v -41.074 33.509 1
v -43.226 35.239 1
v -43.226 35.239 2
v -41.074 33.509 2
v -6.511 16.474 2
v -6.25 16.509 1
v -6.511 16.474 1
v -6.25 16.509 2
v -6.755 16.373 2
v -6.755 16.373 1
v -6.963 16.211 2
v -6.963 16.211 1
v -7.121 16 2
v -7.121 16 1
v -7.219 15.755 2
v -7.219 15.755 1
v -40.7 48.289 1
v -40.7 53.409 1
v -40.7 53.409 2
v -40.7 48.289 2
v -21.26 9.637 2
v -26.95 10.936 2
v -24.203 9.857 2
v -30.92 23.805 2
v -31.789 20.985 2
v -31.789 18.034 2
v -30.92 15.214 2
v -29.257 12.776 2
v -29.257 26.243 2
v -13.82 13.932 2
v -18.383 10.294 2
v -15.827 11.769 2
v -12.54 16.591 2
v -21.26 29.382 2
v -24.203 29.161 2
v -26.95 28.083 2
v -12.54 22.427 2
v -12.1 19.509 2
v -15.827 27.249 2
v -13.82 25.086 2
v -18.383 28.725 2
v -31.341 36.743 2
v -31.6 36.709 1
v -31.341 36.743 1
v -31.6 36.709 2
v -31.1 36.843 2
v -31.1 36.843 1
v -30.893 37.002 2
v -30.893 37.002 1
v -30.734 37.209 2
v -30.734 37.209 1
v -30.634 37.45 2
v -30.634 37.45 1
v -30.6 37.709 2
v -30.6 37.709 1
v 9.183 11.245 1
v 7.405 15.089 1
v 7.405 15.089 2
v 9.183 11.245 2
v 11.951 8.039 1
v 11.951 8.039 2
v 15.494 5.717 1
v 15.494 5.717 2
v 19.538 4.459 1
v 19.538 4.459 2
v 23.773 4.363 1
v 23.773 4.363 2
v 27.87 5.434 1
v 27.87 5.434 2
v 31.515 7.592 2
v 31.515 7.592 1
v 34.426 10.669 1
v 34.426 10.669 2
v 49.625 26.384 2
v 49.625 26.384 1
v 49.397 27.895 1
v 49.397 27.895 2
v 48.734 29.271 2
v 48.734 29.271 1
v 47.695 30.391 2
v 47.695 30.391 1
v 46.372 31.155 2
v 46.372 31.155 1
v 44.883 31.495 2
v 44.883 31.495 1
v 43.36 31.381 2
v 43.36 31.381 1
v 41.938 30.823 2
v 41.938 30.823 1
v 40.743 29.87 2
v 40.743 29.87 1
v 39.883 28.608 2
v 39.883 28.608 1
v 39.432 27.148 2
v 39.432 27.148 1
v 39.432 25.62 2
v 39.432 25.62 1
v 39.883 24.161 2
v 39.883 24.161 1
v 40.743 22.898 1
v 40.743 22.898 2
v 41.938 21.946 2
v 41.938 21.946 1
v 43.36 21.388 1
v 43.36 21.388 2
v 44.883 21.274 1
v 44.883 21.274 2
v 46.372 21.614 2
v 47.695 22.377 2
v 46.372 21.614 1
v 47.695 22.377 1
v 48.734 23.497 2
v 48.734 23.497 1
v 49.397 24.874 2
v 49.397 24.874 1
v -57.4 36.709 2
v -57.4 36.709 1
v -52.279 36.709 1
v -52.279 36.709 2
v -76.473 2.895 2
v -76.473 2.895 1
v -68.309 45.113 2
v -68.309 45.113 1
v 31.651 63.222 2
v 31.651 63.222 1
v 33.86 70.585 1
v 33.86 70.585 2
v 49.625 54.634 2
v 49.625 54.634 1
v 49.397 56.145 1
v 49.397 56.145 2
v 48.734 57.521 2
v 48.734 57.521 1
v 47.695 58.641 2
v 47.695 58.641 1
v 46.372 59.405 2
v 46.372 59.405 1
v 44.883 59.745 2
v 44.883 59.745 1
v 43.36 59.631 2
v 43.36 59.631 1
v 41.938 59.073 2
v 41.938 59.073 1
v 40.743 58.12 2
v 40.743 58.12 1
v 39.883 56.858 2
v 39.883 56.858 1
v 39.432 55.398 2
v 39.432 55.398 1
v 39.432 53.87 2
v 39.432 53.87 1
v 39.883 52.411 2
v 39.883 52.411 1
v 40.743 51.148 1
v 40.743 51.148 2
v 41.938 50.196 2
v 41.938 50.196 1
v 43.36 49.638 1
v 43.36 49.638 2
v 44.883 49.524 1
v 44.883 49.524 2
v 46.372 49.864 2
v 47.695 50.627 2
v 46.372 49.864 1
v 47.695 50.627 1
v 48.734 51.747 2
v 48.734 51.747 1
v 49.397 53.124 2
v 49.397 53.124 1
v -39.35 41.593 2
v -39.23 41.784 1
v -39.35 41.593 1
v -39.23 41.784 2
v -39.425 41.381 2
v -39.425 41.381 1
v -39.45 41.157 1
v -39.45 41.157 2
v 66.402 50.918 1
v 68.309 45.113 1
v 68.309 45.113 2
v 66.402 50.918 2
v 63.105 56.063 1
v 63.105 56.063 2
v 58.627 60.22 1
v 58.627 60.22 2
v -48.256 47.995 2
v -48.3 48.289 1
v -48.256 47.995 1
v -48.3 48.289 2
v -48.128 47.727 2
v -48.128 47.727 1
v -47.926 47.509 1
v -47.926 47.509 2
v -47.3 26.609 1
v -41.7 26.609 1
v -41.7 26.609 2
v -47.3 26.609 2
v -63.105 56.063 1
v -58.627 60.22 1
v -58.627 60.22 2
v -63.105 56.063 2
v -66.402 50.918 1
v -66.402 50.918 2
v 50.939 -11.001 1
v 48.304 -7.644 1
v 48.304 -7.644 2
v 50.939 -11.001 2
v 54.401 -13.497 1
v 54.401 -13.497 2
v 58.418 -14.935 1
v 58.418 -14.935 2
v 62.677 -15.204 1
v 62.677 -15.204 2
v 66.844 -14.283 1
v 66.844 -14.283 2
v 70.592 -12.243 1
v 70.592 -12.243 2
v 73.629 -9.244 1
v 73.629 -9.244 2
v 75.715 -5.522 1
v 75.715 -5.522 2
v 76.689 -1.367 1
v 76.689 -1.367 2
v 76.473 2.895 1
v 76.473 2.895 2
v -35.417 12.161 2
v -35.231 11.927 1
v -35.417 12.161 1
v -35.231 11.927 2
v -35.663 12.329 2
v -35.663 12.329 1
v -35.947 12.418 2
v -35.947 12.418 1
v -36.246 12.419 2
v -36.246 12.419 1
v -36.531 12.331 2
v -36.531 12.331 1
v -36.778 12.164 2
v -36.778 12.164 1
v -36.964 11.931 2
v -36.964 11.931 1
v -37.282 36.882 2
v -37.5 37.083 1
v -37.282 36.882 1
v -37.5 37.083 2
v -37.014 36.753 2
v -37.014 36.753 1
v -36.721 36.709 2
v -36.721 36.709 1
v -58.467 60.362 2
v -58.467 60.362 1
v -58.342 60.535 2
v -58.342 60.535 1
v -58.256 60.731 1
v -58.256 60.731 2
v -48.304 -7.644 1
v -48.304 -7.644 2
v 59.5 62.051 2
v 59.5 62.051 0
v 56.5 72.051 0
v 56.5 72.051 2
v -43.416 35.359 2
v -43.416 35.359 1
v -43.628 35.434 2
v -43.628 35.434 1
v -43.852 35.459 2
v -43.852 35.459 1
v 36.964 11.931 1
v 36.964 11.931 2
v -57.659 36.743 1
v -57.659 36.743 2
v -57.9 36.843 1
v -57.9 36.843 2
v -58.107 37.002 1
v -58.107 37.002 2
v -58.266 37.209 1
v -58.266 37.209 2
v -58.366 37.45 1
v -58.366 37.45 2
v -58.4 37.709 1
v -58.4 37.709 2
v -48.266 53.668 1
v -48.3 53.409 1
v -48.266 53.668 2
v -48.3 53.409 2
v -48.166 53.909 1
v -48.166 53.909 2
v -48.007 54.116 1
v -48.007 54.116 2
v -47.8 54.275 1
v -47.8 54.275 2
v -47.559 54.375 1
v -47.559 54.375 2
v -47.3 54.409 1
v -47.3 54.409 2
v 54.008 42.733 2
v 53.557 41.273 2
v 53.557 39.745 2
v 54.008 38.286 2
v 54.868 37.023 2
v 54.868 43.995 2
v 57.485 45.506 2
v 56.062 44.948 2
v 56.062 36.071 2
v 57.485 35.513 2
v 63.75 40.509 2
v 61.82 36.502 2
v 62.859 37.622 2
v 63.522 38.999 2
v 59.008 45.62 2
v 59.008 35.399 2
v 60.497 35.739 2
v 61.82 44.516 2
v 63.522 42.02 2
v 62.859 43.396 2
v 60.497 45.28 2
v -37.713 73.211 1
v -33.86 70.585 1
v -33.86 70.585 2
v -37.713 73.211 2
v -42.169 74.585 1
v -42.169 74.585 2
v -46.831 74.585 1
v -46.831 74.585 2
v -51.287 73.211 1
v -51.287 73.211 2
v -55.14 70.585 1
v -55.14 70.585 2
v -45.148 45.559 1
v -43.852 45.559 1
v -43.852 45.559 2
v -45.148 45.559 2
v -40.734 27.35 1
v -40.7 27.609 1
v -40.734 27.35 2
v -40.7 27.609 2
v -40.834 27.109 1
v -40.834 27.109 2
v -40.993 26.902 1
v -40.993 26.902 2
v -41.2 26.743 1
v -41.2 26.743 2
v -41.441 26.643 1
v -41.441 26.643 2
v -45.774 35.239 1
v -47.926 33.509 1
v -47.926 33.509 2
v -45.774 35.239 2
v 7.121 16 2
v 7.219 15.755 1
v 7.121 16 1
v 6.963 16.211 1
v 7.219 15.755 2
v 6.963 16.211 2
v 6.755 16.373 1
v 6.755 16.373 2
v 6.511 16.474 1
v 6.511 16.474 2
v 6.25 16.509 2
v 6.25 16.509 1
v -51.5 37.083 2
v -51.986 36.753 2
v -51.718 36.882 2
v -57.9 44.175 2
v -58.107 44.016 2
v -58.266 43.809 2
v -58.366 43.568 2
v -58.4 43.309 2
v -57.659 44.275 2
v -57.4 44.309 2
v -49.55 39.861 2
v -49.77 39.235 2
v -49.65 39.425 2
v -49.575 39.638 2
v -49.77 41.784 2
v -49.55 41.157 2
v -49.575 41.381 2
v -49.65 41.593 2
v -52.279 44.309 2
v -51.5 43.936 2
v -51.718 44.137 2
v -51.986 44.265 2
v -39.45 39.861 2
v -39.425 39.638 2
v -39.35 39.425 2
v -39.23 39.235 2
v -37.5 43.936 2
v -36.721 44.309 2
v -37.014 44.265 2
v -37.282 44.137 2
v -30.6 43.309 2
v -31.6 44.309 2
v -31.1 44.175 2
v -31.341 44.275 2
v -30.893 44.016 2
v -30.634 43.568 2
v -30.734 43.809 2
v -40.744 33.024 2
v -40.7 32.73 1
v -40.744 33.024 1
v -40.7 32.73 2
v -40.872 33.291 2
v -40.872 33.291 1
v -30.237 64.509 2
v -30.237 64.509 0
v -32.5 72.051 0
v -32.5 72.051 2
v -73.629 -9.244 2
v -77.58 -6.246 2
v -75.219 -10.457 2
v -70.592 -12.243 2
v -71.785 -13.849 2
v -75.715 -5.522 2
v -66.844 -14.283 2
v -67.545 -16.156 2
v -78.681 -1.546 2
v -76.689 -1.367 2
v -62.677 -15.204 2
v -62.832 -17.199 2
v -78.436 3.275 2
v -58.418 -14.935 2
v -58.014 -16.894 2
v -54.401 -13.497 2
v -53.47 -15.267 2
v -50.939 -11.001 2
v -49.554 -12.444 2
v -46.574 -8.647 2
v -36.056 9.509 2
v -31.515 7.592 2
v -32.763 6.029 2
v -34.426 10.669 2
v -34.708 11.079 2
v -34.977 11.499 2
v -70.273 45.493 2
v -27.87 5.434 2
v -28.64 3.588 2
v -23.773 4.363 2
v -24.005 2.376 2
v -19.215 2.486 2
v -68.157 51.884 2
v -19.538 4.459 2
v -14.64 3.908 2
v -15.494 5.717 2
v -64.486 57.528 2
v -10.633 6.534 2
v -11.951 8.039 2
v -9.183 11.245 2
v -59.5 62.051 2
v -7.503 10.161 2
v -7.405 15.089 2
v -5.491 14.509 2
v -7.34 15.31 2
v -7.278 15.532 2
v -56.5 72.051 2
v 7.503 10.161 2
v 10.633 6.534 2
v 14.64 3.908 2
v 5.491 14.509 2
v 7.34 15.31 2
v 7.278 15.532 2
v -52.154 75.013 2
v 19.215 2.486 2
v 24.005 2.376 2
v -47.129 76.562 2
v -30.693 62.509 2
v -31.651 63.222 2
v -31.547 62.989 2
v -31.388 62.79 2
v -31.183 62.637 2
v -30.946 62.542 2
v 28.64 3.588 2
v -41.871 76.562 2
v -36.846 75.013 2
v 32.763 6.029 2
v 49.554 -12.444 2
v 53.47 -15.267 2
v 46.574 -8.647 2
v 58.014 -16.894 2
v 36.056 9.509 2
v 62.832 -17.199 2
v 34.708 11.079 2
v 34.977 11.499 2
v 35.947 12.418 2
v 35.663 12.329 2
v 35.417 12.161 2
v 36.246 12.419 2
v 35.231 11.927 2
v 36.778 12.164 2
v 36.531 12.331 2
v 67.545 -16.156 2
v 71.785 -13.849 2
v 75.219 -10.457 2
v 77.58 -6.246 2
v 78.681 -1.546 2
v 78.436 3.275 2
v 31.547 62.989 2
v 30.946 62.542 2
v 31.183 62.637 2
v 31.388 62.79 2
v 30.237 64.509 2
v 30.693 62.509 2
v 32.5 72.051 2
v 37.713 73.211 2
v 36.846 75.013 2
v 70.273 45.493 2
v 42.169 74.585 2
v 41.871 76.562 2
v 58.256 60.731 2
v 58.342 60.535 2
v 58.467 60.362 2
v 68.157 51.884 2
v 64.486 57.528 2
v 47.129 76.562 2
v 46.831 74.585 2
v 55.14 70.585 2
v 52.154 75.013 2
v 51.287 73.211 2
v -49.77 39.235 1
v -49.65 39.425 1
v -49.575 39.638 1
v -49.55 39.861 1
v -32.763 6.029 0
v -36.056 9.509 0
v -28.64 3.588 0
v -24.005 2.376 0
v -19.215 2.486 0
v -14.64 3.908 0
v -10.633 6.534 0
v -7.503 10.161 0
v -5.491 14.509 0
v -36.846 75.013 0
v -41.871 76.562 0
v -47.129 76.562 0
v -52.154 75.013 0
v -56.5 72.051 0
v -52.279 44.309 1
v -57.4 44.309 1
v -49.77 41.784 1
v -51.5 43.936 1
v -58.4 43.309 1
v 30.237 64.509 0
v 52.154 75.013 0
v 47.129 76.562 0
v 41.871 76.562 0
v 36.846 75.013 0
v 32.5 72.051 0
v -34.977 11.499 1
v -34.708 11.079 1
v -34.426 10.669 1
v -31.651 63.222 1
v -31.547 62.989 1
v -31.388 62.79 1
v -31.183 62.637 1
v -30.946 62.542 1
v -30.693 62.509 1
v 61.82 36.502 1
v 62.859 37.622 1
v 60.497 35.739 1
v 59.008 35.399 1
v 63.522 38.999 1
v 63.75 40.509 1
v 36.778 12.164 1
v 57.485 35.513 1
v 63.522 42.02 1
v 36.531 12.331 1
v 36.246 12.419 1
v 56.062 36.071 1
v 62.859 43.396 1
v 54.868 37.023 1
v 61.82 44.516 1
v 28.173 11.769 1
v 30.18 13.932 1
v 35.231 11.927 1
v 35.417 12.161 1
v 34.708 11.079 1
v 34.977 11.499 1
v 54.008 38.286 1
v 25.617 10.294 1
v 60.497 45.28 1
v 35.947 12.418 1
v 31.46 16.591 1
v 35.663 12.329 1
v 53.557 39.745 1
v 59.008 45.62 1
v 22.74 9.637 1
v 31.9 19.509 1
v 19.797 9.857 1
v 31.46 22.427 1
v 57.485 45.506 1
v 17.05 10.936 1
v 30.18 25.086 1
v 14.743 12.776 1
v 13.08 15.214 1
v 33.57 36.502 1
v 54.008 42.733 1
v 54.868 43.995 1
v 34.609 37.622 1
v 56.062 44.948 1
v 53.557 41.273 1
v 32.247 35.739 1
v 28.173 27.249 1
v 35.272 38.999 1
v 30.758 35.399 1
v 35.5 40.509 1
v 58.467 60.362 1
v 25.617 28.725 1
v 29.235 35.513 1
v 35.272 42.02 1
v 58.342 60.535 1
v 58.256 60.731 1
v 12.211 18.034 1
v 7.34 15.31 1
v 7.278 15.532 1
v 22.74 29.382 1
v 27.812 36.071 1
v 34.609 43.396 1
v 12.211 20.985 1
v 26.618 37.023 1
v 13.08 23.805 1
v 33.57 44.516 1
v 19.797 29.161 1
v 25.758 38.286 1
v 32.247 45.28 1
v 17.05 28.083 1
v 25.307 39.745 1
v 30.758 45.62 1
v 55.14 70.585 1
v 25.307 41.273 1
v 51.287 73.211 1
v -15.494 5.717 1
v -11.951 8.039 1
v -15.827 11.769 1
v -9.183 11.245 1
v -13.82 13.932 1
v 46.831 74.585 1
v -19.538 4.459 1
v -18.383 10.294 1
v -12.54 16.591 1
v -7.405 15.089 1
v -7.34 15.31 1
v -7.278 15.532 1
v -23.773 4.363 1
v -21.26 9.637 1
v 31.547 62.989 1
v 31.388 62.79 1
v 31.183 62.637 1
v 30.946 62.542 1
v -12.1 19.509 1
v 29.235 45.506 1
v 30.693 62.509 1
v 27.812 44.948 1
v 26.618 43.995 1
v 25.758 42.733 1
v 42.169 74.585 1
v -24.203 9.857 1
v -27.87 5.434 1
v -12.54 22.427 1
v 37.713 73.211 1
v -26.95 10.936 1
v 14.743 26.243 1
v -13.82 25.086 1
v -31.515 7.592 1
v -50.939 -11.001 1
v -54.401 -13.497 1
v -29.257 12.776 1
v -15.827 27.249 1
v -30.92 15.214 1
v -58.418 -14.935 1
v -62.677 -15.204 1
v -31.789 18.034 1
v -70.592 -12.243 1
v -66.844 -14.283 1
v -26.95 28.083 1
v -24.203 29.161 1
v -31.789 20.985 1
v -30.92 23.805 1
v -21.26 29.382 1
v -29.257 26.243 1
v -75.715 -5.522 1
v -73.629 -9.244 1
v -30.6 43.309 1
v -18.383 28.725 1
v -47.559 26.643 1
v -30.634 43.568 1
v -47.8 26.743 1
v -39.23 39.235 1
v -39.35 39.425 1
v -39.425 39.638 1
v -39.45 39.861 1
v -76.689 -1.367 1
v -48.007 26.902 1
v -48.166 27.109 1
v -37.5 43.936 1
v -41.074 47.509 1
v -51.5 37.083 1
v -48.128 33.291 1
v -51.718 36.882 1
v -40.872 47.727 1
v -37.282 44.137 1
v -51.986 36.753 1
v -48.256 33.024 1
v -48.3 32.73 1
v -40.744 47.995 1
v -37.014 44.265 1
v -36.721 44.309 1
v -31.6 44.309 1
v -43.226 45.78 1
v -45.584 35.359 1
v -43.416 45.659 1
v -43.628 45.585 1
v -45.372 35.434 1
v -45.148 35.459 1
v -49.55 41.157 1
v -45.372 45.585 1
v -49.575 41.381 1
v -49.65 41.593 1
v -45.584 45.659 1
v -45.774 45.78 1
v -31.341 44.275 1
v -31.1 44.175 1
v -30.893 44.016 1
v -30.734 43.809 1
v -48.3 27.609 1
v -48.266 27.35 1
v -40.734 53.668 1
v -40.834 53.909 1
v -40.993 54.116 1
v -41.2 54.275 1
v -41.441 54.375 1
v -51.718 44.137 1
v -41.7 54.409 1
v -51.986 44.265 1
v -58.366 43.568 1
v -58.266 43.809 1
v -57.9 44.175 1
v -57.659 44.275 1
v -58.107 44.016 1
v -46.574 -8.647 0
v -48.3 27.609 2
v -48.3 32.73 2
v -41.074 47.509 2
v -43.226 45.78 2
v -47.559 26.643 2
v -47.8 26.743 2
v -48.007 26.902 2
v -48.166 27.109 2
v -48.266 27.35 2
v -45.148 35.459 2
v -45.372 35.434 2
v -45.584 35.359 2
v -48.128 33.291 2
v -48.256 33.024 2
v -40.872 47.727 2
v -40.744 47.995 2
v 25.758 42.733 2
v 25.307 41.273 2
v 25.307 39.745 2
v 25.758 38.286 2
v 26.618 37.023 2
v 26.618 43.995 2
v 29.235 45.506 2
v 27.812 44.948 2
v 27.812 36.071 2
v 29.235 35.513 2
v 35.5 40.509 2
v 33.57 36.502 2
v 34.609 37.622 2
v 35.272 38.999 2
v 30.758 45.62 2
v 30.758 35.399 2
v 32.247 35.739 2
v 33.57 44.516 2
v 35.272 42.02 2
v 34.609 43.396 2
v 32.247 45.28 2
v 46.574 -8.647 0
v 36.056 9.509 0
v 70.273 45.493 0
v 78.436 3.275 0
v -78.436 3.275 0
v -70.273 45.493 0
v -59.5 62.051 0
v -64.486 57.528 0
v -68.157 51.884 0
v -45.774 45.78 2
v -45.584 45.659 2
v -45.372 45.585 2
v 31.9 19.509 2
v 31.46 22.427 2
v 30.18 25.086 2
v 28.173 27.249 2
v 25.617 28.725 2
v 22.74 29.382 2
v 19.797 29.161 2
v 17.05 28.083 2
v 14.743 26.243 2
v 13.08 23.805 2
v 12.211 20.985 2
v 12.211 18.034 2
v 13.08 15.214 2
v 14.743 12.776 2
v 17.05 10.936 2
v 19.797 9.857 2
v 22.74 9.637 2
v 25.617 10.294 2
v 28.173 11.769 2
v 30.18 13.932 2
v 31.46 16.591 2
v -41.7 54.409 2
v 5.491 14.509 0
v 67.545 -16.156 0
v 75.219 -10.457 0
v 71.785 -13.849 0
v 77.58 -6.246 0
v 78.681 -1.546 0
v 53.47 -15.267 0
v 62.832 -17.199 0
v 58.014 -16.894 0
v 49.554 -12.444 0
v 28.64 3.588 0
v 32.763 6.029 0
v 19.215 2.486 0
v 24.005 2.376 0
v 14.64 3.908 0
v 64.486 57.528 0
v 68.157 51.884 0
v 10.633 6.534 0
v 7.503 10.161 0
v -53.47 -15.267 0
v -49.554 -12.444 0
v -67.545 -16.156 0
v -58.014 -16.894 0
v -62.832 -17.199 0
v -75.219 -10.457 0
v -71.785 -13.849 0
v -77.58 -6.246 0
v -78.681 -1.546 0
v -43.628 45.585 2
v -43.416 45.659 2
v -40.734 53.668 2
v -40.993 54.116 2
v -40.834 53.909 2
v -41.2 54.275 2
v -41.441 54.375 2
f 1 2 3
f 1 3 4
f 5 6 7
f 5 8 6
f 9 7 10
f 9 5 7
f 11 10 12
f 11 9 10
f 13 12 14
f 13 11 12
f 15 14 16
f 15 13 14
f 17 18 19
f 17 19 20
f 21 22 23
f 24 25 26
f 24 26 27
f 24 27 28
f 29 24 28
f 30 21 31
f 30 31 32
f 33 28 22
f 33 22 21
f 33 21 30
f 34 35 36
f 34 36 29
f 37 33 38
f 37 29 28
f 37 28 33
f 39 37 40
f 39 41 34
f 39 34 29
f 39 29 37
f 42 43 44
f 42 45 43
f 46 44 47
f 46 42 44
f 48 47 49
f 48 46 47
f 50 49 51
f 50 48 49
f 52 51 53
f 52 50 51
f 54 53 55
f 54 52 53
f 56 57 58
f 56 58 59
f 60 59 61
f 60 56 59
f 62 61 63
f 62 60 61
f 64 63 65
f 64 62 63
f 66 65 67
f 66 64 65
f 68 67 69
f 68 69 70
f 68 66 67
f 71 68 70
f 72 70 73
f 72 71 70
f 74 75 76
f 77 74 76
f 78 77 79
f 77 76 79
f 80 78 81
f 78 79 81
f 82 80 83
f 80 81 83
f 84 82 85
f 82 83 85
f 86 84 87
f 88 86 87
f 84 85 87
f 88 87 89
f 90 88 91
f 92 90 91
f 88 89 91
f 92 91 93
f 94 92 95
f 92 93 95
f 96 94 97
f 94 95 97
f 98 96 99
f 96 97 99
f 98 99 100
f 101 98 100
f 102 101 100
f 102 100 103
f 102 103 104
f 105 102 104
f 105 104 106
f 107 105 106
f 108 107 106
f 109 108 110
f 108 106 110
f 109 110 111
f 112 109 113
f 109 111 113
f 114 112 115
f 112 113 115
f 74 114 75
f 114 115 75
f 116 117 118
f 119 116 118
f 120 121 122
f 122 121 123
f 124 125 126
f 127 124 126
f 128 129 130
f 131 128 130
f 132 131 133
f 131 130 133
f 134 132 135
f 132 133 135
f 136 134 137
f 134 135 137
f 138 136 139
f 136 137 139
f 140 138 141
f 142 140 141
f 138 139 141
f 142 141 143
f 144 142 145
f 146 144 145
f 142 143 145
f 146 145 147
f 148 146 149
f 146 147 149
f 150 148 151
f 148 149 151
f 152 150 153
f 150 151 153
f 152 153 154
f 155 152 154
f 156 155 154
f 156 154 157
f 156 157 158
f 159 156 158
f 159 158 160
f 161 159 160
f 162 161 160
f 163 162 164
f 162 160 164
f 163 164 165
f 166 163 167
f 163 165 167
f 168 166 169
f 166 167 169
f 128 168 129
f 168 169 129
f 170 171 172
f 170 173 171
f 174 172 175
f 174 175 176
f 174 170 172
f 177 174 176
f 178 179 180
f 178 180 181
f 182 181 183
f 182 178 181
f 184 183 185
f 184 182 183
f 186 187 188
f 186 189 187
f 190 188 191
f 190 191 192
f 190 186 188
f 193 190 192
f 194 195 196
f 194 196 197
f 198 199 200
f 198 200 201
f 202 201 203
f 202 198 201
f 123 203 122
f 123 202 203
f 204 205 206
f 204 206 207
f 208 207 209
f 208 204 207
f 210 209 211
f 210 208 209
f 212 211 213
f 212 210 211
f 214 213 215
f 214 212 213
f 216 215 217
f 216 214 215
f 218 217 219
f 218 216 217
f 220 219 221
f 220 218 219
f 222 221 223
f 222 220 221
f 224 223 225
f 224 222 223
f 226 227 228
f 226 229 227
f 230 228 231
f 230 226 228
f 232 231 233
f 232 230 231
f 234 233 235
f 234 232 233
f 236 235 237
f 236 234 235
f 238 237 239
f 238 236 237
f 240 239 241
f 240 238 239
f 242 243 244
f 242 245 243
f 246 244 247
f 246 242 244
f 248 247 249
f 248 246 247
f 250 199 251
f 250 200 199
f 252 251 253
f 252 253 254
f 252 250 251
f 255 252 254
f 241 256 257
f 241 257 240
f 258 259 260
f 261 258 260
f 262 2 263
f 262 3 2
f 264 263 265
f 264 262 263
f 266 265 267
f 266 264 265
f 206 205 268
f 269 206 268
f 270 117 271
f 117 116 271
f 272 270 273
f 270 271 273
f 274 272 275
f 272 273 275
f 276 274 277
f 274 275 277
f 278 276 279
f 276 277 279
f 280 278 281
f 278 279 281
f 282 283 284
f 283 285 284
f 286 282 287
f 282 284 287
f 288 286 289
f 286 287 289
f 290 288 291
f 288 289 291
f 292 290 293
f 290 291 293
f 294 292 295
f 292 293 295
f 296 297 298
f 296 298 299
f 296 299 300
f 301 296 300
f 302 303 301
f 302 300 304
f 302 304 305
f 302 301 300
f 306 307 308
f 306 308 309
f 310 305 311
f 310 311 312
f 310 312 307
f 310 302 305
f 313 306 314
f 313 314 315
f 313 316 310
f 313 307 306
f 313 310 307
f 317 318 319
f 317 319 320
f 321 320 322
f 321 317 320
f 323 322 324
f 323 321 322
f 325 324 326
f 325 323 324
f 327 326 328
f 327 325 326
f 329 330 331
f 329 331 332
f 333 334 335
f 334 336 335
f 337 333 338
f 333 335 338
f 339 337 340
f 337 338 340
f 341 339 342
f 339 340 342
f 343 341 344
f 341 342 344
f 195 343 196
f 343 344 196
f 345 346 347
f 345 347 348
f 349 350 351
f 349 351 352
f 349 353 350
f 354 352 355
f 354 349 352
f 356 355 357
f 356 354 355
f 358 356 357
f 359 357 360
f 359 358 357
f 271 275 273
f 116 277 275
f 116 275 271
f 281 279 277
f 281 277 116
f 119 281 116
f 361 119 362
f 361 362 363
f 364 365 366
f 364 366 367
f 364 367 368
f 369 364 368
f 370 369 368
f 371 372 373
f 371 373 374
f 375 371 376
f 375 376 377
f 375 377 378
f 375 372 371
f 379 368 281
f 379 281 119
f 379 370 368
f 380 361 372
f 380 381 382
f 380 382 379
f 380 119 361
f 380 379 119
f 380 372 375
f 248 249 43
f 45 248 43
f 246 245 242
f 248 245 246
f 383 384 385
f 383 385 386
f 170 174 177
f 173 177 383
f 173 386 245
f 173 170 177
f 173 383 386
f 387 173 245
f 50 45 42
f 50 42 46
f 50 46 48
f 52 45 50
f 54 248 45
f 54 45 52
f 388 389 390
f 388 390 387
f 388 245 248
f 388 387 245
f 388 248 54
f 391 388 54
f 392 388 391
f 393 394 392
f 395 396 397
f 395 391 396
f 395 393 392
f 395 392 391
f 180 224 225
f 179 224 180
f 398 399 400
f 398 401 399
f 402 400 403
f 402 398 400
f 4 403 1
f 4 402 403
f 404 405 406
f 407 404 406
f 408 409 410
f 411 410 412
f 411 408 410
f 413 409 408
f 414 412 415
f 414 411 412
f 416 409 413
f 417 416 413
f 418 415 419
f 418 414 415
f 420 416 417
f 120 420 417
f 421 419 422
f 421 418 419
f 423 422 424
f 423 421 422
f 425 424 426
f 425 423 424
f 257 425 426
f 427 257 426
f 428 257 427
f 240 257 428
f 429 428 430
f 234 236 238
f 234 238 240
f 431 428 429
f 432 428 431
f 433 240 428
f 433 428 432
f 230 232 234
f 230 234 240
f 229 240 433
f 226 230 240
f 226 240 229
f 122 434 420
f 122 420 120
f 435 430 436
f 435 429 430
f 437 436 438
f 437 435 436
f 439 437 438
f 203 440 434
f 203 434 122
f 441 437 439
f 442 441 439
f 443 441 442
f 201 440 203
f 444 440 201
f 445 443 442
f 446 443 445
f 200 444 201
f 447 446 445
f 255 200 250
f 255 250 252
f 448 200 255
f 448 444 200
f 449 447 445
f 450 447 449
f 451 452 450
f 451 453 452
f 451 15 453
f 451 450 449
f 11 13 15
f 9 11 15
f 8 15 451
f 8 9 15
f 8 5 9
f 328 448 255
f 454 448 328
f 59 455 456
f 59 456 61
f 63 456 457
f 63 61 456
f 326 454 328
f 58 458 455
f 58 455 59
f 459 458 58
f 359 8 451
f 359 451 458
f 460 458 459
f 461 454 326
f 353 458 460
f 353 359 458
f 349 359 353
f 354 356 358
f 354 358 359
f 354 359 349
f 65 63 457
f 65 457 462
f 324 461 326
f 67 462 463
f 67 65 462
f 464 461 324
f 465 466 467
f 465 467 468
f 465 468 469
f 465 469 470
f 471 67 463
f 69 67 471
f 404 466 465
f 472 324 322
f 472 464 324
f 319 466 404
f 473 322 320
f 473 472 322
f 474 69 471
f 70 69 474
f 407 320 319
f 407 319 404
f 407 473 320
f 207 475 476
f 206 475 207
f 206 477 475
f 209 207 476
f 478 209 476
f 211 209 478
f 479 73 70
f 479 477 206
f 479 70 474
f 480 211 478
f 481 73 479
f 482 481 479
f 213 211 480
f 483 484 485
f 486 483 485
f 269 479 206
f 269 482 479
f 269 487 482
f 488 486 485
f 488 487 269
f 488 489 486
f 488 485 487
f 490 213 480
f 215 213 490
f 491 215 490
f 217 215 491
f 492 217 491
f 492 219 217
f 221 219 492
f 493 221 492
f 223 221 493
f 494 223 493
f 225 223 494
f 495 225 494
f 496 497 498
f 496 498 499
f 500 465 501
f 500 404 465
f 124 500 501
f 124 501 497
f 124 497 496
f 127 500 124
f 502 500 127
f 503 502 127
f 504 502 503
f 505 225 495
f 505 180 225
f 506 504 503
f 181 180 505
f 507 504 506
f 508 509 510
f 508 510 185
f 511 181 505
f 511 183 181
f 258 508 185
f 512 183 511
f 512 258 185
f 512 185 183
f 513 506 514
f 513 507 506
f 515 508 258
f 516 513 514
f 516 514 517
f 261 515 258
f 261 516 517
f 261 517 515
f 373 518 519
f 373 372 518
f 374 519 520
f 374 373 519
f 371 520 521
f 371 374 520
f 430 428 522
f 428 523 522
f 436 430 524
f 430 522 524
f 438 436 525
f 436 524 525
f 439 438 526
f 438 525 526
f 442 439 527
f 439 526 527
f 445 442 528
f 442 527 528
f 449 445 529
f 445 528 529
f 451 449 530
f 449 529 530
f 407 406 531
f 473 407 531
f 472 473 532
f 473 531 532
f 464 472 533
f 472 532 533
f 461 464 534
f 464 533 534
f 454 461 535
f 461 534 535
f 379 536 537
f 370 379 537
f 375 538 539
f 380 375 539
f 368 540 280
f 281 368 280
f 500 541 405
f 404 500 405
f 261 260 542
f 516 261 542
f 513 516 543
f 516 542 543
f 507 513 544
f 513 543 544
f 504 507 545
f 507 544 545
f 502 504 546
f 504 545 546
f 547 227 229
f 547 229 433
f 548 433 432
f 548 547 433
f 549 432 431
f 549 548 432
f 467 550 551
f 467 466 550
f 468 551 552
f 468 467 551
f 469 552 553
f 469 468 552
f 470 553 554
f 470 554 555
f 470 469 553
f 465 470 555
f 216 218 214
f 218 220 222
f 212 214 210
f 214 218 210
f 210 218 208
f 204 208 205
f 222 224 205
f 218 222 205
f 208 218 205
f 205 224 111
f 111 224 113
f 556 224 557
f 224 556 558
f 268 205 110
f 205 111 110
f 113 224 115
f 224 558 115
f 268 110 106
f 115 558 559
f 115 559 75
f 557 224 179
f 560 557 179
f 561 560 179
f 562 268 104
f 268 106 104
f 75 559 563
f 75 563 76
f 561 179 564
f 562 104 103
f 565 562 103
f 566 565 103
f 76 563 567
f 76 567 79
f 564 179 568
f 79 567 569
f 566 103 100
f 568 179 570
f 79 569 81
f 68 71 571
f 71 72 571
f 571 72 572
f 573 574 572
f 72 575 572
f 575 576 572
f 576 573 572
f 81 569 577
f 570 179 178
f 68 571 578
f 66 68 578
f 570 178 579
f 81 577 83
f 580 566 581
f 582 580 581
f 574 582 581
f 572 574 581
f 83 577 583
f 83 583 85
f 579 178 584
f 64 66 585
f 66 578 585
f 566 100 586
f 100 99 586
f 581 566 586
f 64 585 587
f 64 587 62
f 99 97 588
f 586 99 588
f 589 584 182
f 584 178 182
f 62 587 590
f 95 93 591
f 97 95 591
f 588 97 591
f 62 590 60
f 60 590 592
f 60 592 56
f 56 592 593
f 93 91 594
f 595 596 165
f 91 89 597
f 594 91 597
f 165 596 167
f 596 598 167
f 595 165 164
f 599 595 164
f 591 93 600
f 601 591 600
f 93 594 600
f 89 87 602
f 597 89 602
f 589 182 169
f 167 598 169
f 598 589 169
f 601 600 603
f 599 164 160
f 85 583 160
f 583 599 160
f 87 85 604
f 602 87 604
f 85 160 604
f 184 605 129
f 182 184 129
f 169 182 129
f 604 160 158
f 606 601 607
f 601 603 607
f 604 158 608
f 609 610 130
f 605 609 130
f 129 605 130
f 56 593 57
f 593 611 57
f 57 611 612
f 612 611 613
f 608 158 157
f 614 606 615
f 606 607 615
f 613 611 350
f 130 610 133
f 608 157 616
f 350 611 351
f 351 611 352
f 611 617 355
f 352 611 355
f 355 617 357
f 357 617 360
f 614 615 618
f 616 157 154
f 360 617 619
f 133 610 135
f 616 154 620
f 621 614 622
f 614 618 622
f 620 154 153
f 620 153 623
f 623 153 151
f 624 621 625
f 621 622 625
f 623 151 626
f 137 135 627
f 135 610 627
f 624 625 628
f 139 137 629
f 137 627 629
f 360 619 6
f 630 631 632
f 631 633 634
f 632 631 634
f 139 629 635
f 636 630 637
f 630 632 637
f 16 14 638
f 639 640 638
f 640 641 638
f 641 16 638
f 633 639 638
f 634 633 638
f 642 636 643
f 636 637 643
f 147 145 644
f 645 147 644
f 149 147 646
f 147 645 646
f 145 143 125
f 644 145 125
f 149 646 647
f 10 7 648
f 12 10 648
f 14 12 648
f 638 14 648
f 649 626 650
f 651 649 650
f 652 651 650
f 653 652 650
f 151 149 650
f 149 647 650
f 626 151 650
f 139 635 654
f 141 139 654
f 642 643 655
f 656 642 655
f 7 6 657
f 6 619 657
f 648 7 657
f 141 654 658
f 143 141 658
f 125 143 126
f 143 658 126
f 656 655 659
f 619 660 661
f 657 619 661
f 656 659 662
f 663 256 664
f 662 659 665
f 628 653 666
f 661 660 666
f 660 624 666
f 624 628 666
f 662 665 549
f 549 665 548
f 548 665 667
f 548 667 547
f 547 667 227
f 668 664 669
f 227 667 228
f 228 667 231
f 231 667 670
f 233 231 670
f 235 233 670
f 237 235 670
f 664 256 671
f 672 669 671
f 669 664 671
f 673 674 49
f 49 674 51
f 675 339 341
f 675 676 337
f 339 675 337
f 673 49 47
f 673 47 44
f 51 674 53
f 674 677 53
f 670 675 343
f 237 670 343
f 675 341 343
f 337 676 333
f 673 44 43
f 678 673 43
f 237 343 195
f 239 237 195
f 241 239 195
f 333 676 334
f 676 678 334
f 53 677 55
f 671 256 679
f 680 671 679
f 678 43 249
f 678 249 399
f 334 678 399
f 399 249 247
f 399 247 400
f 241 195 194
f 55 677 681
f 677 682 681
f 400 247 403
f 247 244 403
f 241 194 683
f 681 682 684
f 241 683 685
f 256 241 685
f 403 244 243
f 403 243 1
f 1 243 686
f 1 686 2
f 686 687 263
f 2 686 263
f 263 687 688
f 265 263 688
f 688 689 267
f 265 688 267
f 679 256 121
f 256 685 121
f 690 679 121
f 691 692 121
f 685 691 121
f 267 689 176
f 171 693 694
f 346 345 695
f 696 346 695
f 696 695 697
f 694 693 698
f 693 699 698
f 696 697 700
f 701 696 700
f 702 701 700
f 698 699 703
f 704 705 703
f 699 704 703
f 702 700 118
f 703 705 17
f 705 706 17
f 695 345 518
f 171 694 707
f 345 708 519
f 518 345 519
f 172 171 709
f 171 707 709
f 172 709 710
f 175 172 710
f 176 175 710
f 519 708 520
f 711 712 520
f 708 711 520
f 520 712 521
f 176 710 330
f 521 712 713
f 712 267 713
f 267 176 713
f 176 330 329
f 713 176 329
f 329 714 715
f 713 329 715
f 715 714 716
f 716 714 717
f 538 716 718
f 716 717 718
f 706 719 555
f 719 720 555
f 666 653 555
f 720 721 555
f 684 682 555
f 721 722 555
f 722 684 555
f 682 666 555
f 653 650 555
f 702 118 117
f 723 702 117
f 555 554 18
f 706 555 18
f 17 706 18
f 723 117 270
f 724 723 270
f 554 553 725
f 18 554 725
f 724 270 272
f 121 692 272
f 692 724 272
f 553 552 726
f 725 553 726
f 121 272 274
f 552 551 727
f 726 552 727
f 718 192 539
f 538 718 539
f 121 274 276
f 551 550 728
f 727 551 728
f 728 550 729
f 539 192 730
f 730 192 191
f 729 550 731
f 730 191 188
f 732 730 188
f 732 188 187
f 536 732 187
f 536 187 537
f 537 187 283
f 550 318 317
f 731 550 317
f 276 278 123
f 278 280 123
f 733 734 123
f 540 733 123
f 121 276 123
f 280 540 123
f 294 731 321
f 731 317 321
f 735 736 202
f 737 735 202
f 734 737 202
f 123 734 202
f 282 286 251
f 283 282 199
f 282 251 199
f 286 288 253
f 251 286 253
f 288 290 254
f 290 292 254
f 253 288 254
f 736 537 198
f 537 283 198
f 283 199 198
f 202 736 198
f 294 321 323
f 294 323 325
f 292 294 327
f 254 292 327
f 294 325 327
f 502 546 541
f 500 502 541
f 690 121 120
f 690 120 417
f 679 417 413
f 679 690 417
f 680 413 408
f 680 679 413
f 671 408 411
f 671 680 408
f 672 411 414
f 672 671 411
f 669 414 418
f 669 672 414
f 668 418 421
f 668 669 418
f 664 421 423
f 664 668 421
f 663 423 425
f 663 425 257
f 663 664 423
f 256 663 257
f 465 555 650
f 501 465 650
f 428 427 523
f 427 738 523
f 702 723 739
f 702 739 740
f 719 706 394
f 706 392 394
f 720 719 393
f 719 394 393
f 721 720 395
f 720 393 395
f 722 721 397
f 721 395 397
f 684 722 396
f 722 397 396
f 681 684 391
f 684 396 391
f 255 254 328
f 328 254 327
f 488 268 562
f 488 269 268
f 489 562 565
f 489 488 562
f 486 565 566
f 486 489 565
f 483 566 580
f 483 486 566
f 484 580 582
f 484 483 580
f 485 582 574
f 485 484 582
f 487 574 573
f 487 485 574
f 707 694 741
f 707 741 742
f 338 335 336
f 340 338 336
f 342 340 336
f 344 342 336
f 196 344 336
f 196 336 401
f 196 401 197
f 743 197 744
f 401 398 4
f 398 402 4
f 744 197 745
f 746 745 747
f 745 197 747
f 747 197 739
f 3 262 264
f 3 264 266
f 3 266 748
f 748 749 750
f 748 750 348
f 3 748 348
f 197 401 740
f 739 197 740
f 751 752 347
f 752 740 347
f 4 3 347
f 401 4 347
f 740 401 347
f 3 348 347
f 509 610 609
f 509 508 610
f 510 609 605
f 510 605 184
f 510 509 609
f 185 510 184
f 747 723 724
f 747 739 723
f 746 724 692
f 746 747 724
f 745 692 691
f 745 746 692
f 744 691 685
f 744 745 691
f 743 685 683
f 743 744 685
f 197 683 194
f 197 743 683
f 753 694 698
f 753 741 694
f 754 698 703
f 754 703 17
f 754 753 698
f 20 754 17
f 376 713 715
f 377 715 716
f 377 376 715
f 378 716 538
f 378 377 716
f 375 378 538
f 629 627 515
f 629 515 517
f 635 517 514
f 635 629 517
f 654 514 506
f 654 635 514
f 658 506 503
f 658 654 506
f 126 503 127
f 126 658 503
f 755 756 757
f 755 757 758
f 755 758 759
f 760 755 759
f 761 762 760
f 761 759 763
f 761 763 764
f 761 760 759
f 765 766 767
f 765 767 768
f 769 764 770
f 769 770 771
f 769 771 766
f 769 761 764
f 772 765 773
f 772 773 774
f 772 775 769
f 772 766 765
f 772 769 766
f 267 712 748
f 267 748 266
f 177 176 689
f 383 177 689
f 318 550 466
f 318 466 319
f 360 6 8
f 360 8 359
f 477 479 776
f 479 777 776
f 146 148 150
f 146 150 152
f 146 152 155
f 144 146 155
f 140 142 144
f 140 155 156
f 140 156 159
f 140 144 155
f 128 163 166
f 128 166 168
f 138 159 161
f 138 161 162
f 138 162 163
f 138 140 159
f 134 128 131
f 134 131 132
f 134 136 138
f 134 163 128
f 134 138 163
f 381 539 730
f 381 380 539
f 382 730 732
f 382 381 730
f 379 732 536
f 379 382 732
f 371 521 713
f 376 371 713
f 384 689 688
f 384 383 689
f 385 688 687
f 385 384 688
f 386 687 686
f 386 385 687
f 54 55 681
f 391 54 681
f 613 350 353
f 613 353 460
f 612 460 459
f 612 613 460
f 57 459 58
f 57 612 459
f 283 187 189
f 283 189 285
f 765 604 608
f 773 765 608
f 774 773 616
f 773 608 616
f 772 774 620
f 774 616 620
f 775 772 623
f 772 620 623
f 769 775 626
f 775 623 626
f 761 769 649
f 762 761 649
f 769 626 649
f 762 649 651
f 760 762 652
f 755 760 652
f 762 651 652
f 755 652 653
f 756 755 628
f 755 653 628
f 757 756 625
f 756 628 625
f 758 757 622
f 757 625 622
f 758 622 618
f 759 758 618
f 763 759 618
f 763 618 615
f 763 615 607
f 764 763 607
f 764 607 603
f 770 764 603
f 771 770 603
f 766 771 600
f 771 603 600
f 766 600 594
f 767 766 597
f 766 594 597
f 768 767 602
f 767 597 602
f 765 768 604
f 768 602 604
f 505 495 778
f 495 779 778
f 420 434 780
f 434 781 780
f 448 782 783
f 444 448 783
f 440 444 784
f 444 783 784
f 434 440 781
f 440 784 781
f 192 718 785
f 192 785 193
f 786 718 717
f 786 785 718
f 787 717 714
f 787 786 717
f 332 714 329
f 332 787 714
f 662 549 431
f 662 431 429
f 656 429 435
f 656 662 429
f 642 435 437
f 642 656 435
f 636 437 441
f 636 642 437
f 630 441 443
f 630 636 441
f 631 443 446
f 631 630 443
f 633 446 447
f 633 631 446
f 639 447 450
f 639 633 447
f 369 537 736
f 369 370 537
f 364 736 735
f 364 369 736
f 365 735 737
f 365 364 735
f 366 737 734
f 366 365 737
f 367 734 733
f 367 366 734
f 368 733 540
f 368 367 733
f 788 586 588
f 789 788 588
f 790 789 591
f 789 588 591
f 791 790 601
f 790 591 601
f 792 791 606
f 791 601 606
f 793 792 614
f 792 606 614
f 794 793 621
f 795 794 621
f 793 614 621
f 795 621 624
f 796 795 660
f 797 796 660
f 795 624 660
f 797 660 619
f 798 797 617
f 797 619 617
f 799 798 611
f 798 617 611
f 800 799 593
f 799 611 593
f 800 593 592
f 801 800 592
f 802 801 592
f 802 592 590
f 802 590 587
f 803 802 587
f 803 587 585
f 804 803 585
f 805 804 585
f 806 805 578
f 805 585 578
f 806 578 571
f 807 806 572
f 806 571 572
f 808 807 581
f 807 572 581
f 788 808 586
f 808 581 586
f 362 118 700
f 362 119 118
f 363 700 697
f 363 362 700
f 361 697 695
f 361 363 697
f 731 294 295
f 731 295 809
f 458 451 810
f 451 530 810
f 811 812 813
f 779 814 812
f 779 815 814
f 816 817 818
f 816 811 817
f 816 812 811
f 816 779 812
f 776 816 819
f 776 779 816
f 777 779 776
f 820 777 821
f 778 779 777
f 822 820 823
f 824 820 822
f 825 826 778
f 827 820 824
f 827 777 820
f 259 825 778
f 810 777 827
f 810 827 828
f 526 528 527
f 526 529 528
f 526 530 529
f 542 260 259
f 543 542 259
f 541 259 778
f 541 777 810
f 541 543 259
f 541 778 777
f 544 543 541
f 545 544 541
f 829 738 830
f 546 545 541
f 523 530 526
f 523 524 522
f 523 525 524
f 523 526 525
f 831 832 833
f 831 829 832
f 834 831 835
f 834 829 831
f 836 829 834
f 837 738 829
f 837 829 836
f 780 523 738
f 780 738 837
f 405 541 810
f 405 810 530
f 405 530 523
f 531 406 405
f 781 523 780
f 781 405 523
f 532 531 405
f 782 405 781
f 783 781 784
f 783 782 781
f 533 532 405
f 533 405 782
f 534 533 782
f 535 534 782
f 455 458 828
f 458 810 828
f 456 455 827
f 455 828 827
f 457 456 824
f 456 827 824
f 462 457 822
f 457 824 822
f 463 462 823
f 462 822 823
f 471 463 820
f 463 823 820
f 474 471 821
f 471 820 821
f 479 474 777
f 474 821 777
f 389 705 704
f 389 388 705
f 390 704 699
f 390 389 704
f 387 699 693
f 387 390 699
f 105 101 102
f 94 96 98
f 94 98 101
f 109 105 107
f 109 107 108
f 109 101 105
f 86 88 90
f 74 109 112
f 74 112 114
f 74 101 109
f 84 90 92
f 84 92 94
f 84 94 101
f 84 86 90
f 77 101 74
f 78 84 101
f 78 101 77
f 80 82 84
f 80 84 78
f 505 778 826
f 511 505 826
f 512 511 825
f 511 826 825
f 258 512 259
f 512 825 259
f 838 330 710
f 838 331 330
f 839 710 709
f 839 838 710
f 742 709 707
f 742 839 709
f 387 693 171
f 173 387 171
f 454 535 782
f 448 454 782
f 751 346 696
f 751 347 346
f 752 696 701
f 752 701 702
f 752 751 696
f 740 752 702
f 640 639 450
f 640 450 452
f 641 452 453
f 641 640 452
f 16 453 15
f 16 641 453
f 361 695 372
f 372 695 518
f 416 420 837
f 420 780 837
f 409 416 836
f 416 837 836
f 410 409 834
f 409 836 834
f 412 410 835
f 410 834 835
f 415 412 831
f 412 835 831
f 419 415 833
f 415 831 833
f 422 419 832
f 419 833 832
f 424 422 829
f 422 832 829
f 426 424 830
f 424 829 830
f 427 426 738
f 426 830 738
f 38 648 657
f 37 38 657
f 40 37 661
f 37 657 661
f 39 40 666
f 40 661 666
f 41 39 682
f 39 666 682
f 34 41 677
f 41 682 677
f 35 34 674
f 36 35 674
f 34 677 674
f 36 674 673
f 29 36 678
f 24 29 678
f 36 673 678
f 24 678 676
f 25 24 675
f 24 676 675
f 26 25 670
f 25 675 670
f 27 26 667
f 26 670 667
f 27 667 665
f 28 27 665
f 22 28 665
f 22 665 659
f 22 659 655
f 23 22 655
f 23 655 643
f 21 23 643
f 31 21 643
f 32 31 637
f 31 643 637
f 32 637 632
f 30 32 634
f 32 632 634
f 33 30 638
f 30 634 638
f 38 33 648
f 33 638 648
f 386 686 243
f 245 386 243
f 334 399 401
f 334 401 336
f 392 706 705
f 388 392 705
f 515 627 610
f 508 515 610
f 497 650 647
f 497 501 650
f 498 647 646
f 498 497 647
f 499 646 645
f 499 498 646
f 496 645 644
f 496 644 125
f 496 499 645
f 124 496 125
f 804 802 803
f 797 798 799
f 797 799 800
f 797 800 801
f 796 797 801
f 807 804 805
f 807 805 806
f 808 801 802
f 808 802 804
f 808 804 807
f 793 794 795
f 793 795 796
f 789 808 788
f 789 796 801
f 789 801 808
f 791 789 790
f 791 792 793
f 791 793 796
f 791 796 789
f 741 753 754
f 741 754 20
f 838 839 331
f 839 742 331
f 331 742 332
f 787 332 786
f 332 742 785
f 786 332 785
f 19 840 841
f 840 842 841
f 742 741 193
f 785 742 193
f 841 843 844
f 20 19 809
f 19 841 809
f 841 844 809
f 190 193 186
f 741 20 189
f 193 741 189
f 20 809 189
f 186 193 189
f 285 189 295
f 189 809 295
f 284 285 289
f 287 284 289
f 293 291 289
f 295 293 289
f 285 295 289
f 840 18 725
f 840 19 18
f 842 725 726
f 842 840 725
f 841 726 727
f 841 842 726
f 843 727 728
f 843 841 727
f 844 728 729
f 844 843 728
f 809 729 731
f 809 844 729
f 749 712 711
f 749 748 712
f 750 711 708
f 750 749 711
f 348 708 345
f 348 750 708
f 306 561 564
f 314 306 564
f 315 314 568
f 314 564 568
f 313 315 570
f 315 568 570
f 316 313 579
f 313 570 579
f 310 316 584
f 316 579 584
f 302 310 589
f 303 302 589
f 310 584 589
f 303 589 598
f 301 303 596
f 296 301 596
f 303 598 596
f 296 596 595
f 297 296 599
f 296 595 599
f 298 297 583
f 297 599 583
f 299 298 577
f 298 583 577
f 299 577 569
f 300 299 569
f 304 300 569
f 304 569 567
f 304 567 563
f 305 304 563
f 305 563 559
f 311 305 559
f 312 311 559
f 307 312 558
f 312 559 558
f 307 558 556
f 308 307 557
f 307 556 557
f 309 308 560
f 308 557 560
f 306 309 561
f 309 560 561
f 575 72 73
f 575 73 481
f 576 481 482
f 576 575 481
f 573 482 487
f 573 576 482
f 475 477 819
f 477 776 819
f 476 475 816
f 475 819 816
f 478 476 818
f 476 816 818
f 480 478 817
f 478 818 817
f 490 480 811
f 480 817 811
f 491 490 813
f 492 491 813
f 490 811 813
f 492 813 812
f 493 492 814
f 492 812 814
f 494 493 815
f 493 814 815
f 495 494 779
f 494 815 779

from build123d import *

# Parameters (mm, degrees)
PAD_DEPTH     = 1
SKETCH001_R   = 5.125
SKETCH001_R_2 = 9.9
PAD001_DEPTH  = 1
FILLET_R      = 1


with BuildPart() as part:
    # Sketch → Pad (new body)
    with BuildSketch(Plane.XY):
        with BuildLine():
            Line((70.272578, 45.492899), (78.436266, 3.274963))
            ThreePointArc((46.573742, -8.646925), (67.545071, -16.156101), (78.436266, 3.274963))
            Line((36.055693, 9.509252), (46.573742, -8.646925))
            ThreePointArc((5.490533, 14.509252), (19.215175, 2.485526), (36.055693, 9.509252))
            Line((-5.490533, 14.509252), (5.490533, 14.509252))
            ThreePointArc((-36.055693, 9.509252), (-19.215175, 2.485526), (-5.490533, 14.509252))
            Line((-46.573742, -8.646925), (-36.055693, 9.509252))
            ThreePointArc((-78.436265, 3.274968), (-67.545074, -16.1561), (-46.573742, -8.646925))
            Line((-70.272577, 45.492905), (-78.436265, 3.274968))
            ThreePointArc((-59.5, 62.051362), (-66.503327, 54.824144), (-70.272577, 45.492905))
            Line((-59.5, 62.051362), (-56.5, 72.051362))
            ThreePointArc((-32.5, 72.051362), (-44.5, 76.759252), (-56.5, 72.051362))
            Line((-32.5, 72.051362), (-30.237367, 64.509252))
            Line((-30.237367, 64.509252), (30.237367, 64.509252))
            Line((30.237367, 64.509252), (32.5, 72.051362))
            ThreePointArc((56.5, 72.051362), (44.5, 76.759252), (32.5, 72.051362))
            Line((56.5, 72.051362), (59.5, 62.051362))
            ThreePointArc((70.272578, 45.492899), (66.503328, 54.824142), (59.5, 62.051362))
        make_face()
    extrude(amount=PAD_DEPTH)

    # Sketch001 (on Face20 of Pad) → Pad001 (join)
    with BuildSketch(Plane.XY.offset(1)):
        with BuildLine():
            ThreePointArc((-59.5, 62.051362), (-66.503327, 54.824144), (-70.272577, 45.492905))
            Line((-70.272577, 45.492905), (-78.436265, 3.274968))
            ThreePointArc((-78.436265, 3.274968), (-67.545074, -16.1561), (-46.573742, -8.646925))
            Line((-46.573742, -8.646925), (-36.055693, 9.509252))
            ThreePointArc((-36.055693, 9.509252), (-19.215175, 2.485526), (-5.490533, 14.509252))
            Line((-5.490533, 14.509252), (5.490533, 14.509252))
            ThreePointArc((5.490533, 14.509252), (19.215175, 2.485526), (36.055693, 9.509252))
            Line((36.055693, 9.509252), (46.573742, -8.646925))
            ThreePointArc((46.573742, -8.646925), (67.545071, -16.156101), (78.436266, 3.274963))
            Line((78.436266, 3.274963), (70.272578, 45.492899))
            ThreePointArc((70.272578, 45.492899), (66.503328, 54.824142), (59.5, 62.051362))
            Line((59.5, 62.051362), (56.5, 72.051362))
            ThreePointArc((56.5, 72.051362), (44.5, 76.759252), (32.5, 72.051362))
            Line((32.5, 72.051362), (30.237367, 64.509252))
            Line((30.237367, 64.509252), (-30.237367, 64.509252))
            Line((-30.237367, 64.509252), (-32.5, 72.051362))
            ThreePointArc((-32.5, 72.051362), (-44.5, 76.759252), (-56.5, 72.051362))
            Line((-56.5, 72.051362), (-59.5, 62.051362))
        make_face()
        with BuildLine():
            ThreePointArc((55.140028, 70.584912), (44.5, 74.759252), (33.859972, 70.584912))
            Line((31.437274, 62.509252), (33.859972, 70.584912))
            Line((-31.437274, 62.509252), (31.437274, 62.509252))
            Line((-31.437274, 62.509252), (-33.859972, 70.584912))
            ThreePointArc((-33.859972, 70.584912), (-44.5, 74.759252), (-55.140028, 70.584912))
            Line((-58.357143, 60.410059), (-55.140028, 70.584912))
            ThreePointArc((-58.357143, 60.410059), (-64.826883, 53.733485), (-68.308952, 45.113198))
            Line((-76.47264, 2.895262), (-68.308952, 45.113198))
            ThreePointArc((-76.47264, 2.895262), (-66.844196, -14.282929), (-48.304323, -7.644383))
            Line((-48.304323, -7.644383), (-36.03269, 13.538817))
            ThreePointArc((-36.03269, 13.538817), (-35.306977, 12.060301), (-34.426047, 10.668673))
            ThreePointArc((-34.426047, 10.668673), (-19.538053, 4.459292), (-7.404674, 15.088962))
            ThreePointArc((-7.404674, 15.088962), (-7.209276, 15.794824), (-7.047993, 16.509252))
            Line((-7.047993, 16.509252), (7.047993, 16.509252))
            ThreePointArc((7.047993, 16.509252), (7.209276, 15.794824), (7.404674, 15.088962))
            ThreePointArc((7.404674, 15.088962), (19.538053, 4.459292), (34.426047, 10.668673))
            ThreePointArc((34.426047, 10.668673), (35.306977, 12.060301), (36.03269, 13.538817))
            Line((48.304323, -7.644383), (36.03269, 13.538817))
            ThreePointArc((48.304323, -7.644383), (66.844194, -14.28293), (76.472641, 2.895257))
            Line((76.472641, 2.895257), (68.308953, 45.113193))
            ThreePointArc((68.308953, 45.113193), (64.826884, 53.733483), (58.357143, 60.410059))
            Line((55.140028, 70.584912), (58.357143, 60.410059))
        make_face(mode=Mode.SUBTRACT)
        with Locations((30.375, 40.509252)):
            Circle(SKETCH001_R)
        with Locations((44.5, 54.634252)):
            Circle(SKETCH001_R)
        with Locations((58.625, 40.509252)):
            Circle(SKETCH001_R)
        with Locations((44.5, 26.384252)):
            Circle(SKETCH001_R)
        with Locations((-22, 19.509252)):
            Circle(SKETCH001_R_2)
        with Locations((22, 19.509252)):
            Circle(SKETCH001_R_2)
        Polygon((-58.4, 36.709252), (-51.8, 36.709252), (-49.55, 39.509252), (-49.55, 41.509252), (-51.8, 44.309252), (-58.4, 44.309252), align=None)
        Polygon((-40.7, 26.609252), (-48.3, 26.609252), (-48.3, 33.209252), (-45.5, 35.459252), (-43.5, 35.459252), (-40.7, 33.209252), align=None)
        Polygon((-30.6, 44.309252), (-37.2, 44.309252), (-39.45, 41.509252), (-39.45, 39.509252), (-37.2, 36.709252), (-30.6, 36.709252), align=None)
        Polygon((-48.3, 54.409252), (-40.7, 54.409252), (-40.7, 47.809252), (-43.5, 45.559252), (-45.5, 45.559252), (-48.3, 47.809252), align=None)
    extrude(amount=PAD001_DEPTH)

    # Fillet
    fillet_edges = [part.edges().sort_by_distance(p)[0] for p in [
        (-36.03269, 13.538817, 1.5),
        (-48.3, 26.609252, 1.5),
        (-58.4, 36.709252, 1.5),
        (-58.4, 44.309252, 1.5),
        (-48.3, 54.409252, 1.5),
        (-31.437274, 62.509252, 1.5),
        (-40.7, 54.409252, 1.5),
        (-30.6, 44.309252, 1.5),
        (-30.6, 36.709252, 1.5),
        (-40.7, 26.609252, 1.5),
        (-7.047993, 16.509252, 1.5),
        (36.03269, 13.538817, 1.5),
        (31.437274, 62.509252, 1.5),
        (58.357143, 60.410059, 1.5),
        (7.047993, 16.509252, 1.5),
        (-58.357143, 60.410059, 1.5),
        (-37.2, 36.709252, 1.5),
        (-39.45, 39.509252, 1.5),
        (-43.5, 45.559252, 1.5),
        (-45.5, 45.559252, 1.5),
        (-48.3, 47.809252, 1.5),
        (-51.8, 36.709252, 1.5),
        (-48.3, 33.209252, 1.5),
        (-51.8, 44.309252, 1.5),
        (-49.55, 41.509252, 1.5),
        (-49.55, 39.509252, 1.5),
        (-45.5, 35.459252, 1.5),
        (-43.5, 35.459252, 1.5),
        (-40.7, 33.209252, 1.5),
        (-37.2, 44.309252, 1.5),
        (-40.7, 47.809252, 1.5),
        (-39.45, 41.509252, 1.5),
    ]]
    fillet(fillet_edges, radius=FILLET_R)


solid = part.part
